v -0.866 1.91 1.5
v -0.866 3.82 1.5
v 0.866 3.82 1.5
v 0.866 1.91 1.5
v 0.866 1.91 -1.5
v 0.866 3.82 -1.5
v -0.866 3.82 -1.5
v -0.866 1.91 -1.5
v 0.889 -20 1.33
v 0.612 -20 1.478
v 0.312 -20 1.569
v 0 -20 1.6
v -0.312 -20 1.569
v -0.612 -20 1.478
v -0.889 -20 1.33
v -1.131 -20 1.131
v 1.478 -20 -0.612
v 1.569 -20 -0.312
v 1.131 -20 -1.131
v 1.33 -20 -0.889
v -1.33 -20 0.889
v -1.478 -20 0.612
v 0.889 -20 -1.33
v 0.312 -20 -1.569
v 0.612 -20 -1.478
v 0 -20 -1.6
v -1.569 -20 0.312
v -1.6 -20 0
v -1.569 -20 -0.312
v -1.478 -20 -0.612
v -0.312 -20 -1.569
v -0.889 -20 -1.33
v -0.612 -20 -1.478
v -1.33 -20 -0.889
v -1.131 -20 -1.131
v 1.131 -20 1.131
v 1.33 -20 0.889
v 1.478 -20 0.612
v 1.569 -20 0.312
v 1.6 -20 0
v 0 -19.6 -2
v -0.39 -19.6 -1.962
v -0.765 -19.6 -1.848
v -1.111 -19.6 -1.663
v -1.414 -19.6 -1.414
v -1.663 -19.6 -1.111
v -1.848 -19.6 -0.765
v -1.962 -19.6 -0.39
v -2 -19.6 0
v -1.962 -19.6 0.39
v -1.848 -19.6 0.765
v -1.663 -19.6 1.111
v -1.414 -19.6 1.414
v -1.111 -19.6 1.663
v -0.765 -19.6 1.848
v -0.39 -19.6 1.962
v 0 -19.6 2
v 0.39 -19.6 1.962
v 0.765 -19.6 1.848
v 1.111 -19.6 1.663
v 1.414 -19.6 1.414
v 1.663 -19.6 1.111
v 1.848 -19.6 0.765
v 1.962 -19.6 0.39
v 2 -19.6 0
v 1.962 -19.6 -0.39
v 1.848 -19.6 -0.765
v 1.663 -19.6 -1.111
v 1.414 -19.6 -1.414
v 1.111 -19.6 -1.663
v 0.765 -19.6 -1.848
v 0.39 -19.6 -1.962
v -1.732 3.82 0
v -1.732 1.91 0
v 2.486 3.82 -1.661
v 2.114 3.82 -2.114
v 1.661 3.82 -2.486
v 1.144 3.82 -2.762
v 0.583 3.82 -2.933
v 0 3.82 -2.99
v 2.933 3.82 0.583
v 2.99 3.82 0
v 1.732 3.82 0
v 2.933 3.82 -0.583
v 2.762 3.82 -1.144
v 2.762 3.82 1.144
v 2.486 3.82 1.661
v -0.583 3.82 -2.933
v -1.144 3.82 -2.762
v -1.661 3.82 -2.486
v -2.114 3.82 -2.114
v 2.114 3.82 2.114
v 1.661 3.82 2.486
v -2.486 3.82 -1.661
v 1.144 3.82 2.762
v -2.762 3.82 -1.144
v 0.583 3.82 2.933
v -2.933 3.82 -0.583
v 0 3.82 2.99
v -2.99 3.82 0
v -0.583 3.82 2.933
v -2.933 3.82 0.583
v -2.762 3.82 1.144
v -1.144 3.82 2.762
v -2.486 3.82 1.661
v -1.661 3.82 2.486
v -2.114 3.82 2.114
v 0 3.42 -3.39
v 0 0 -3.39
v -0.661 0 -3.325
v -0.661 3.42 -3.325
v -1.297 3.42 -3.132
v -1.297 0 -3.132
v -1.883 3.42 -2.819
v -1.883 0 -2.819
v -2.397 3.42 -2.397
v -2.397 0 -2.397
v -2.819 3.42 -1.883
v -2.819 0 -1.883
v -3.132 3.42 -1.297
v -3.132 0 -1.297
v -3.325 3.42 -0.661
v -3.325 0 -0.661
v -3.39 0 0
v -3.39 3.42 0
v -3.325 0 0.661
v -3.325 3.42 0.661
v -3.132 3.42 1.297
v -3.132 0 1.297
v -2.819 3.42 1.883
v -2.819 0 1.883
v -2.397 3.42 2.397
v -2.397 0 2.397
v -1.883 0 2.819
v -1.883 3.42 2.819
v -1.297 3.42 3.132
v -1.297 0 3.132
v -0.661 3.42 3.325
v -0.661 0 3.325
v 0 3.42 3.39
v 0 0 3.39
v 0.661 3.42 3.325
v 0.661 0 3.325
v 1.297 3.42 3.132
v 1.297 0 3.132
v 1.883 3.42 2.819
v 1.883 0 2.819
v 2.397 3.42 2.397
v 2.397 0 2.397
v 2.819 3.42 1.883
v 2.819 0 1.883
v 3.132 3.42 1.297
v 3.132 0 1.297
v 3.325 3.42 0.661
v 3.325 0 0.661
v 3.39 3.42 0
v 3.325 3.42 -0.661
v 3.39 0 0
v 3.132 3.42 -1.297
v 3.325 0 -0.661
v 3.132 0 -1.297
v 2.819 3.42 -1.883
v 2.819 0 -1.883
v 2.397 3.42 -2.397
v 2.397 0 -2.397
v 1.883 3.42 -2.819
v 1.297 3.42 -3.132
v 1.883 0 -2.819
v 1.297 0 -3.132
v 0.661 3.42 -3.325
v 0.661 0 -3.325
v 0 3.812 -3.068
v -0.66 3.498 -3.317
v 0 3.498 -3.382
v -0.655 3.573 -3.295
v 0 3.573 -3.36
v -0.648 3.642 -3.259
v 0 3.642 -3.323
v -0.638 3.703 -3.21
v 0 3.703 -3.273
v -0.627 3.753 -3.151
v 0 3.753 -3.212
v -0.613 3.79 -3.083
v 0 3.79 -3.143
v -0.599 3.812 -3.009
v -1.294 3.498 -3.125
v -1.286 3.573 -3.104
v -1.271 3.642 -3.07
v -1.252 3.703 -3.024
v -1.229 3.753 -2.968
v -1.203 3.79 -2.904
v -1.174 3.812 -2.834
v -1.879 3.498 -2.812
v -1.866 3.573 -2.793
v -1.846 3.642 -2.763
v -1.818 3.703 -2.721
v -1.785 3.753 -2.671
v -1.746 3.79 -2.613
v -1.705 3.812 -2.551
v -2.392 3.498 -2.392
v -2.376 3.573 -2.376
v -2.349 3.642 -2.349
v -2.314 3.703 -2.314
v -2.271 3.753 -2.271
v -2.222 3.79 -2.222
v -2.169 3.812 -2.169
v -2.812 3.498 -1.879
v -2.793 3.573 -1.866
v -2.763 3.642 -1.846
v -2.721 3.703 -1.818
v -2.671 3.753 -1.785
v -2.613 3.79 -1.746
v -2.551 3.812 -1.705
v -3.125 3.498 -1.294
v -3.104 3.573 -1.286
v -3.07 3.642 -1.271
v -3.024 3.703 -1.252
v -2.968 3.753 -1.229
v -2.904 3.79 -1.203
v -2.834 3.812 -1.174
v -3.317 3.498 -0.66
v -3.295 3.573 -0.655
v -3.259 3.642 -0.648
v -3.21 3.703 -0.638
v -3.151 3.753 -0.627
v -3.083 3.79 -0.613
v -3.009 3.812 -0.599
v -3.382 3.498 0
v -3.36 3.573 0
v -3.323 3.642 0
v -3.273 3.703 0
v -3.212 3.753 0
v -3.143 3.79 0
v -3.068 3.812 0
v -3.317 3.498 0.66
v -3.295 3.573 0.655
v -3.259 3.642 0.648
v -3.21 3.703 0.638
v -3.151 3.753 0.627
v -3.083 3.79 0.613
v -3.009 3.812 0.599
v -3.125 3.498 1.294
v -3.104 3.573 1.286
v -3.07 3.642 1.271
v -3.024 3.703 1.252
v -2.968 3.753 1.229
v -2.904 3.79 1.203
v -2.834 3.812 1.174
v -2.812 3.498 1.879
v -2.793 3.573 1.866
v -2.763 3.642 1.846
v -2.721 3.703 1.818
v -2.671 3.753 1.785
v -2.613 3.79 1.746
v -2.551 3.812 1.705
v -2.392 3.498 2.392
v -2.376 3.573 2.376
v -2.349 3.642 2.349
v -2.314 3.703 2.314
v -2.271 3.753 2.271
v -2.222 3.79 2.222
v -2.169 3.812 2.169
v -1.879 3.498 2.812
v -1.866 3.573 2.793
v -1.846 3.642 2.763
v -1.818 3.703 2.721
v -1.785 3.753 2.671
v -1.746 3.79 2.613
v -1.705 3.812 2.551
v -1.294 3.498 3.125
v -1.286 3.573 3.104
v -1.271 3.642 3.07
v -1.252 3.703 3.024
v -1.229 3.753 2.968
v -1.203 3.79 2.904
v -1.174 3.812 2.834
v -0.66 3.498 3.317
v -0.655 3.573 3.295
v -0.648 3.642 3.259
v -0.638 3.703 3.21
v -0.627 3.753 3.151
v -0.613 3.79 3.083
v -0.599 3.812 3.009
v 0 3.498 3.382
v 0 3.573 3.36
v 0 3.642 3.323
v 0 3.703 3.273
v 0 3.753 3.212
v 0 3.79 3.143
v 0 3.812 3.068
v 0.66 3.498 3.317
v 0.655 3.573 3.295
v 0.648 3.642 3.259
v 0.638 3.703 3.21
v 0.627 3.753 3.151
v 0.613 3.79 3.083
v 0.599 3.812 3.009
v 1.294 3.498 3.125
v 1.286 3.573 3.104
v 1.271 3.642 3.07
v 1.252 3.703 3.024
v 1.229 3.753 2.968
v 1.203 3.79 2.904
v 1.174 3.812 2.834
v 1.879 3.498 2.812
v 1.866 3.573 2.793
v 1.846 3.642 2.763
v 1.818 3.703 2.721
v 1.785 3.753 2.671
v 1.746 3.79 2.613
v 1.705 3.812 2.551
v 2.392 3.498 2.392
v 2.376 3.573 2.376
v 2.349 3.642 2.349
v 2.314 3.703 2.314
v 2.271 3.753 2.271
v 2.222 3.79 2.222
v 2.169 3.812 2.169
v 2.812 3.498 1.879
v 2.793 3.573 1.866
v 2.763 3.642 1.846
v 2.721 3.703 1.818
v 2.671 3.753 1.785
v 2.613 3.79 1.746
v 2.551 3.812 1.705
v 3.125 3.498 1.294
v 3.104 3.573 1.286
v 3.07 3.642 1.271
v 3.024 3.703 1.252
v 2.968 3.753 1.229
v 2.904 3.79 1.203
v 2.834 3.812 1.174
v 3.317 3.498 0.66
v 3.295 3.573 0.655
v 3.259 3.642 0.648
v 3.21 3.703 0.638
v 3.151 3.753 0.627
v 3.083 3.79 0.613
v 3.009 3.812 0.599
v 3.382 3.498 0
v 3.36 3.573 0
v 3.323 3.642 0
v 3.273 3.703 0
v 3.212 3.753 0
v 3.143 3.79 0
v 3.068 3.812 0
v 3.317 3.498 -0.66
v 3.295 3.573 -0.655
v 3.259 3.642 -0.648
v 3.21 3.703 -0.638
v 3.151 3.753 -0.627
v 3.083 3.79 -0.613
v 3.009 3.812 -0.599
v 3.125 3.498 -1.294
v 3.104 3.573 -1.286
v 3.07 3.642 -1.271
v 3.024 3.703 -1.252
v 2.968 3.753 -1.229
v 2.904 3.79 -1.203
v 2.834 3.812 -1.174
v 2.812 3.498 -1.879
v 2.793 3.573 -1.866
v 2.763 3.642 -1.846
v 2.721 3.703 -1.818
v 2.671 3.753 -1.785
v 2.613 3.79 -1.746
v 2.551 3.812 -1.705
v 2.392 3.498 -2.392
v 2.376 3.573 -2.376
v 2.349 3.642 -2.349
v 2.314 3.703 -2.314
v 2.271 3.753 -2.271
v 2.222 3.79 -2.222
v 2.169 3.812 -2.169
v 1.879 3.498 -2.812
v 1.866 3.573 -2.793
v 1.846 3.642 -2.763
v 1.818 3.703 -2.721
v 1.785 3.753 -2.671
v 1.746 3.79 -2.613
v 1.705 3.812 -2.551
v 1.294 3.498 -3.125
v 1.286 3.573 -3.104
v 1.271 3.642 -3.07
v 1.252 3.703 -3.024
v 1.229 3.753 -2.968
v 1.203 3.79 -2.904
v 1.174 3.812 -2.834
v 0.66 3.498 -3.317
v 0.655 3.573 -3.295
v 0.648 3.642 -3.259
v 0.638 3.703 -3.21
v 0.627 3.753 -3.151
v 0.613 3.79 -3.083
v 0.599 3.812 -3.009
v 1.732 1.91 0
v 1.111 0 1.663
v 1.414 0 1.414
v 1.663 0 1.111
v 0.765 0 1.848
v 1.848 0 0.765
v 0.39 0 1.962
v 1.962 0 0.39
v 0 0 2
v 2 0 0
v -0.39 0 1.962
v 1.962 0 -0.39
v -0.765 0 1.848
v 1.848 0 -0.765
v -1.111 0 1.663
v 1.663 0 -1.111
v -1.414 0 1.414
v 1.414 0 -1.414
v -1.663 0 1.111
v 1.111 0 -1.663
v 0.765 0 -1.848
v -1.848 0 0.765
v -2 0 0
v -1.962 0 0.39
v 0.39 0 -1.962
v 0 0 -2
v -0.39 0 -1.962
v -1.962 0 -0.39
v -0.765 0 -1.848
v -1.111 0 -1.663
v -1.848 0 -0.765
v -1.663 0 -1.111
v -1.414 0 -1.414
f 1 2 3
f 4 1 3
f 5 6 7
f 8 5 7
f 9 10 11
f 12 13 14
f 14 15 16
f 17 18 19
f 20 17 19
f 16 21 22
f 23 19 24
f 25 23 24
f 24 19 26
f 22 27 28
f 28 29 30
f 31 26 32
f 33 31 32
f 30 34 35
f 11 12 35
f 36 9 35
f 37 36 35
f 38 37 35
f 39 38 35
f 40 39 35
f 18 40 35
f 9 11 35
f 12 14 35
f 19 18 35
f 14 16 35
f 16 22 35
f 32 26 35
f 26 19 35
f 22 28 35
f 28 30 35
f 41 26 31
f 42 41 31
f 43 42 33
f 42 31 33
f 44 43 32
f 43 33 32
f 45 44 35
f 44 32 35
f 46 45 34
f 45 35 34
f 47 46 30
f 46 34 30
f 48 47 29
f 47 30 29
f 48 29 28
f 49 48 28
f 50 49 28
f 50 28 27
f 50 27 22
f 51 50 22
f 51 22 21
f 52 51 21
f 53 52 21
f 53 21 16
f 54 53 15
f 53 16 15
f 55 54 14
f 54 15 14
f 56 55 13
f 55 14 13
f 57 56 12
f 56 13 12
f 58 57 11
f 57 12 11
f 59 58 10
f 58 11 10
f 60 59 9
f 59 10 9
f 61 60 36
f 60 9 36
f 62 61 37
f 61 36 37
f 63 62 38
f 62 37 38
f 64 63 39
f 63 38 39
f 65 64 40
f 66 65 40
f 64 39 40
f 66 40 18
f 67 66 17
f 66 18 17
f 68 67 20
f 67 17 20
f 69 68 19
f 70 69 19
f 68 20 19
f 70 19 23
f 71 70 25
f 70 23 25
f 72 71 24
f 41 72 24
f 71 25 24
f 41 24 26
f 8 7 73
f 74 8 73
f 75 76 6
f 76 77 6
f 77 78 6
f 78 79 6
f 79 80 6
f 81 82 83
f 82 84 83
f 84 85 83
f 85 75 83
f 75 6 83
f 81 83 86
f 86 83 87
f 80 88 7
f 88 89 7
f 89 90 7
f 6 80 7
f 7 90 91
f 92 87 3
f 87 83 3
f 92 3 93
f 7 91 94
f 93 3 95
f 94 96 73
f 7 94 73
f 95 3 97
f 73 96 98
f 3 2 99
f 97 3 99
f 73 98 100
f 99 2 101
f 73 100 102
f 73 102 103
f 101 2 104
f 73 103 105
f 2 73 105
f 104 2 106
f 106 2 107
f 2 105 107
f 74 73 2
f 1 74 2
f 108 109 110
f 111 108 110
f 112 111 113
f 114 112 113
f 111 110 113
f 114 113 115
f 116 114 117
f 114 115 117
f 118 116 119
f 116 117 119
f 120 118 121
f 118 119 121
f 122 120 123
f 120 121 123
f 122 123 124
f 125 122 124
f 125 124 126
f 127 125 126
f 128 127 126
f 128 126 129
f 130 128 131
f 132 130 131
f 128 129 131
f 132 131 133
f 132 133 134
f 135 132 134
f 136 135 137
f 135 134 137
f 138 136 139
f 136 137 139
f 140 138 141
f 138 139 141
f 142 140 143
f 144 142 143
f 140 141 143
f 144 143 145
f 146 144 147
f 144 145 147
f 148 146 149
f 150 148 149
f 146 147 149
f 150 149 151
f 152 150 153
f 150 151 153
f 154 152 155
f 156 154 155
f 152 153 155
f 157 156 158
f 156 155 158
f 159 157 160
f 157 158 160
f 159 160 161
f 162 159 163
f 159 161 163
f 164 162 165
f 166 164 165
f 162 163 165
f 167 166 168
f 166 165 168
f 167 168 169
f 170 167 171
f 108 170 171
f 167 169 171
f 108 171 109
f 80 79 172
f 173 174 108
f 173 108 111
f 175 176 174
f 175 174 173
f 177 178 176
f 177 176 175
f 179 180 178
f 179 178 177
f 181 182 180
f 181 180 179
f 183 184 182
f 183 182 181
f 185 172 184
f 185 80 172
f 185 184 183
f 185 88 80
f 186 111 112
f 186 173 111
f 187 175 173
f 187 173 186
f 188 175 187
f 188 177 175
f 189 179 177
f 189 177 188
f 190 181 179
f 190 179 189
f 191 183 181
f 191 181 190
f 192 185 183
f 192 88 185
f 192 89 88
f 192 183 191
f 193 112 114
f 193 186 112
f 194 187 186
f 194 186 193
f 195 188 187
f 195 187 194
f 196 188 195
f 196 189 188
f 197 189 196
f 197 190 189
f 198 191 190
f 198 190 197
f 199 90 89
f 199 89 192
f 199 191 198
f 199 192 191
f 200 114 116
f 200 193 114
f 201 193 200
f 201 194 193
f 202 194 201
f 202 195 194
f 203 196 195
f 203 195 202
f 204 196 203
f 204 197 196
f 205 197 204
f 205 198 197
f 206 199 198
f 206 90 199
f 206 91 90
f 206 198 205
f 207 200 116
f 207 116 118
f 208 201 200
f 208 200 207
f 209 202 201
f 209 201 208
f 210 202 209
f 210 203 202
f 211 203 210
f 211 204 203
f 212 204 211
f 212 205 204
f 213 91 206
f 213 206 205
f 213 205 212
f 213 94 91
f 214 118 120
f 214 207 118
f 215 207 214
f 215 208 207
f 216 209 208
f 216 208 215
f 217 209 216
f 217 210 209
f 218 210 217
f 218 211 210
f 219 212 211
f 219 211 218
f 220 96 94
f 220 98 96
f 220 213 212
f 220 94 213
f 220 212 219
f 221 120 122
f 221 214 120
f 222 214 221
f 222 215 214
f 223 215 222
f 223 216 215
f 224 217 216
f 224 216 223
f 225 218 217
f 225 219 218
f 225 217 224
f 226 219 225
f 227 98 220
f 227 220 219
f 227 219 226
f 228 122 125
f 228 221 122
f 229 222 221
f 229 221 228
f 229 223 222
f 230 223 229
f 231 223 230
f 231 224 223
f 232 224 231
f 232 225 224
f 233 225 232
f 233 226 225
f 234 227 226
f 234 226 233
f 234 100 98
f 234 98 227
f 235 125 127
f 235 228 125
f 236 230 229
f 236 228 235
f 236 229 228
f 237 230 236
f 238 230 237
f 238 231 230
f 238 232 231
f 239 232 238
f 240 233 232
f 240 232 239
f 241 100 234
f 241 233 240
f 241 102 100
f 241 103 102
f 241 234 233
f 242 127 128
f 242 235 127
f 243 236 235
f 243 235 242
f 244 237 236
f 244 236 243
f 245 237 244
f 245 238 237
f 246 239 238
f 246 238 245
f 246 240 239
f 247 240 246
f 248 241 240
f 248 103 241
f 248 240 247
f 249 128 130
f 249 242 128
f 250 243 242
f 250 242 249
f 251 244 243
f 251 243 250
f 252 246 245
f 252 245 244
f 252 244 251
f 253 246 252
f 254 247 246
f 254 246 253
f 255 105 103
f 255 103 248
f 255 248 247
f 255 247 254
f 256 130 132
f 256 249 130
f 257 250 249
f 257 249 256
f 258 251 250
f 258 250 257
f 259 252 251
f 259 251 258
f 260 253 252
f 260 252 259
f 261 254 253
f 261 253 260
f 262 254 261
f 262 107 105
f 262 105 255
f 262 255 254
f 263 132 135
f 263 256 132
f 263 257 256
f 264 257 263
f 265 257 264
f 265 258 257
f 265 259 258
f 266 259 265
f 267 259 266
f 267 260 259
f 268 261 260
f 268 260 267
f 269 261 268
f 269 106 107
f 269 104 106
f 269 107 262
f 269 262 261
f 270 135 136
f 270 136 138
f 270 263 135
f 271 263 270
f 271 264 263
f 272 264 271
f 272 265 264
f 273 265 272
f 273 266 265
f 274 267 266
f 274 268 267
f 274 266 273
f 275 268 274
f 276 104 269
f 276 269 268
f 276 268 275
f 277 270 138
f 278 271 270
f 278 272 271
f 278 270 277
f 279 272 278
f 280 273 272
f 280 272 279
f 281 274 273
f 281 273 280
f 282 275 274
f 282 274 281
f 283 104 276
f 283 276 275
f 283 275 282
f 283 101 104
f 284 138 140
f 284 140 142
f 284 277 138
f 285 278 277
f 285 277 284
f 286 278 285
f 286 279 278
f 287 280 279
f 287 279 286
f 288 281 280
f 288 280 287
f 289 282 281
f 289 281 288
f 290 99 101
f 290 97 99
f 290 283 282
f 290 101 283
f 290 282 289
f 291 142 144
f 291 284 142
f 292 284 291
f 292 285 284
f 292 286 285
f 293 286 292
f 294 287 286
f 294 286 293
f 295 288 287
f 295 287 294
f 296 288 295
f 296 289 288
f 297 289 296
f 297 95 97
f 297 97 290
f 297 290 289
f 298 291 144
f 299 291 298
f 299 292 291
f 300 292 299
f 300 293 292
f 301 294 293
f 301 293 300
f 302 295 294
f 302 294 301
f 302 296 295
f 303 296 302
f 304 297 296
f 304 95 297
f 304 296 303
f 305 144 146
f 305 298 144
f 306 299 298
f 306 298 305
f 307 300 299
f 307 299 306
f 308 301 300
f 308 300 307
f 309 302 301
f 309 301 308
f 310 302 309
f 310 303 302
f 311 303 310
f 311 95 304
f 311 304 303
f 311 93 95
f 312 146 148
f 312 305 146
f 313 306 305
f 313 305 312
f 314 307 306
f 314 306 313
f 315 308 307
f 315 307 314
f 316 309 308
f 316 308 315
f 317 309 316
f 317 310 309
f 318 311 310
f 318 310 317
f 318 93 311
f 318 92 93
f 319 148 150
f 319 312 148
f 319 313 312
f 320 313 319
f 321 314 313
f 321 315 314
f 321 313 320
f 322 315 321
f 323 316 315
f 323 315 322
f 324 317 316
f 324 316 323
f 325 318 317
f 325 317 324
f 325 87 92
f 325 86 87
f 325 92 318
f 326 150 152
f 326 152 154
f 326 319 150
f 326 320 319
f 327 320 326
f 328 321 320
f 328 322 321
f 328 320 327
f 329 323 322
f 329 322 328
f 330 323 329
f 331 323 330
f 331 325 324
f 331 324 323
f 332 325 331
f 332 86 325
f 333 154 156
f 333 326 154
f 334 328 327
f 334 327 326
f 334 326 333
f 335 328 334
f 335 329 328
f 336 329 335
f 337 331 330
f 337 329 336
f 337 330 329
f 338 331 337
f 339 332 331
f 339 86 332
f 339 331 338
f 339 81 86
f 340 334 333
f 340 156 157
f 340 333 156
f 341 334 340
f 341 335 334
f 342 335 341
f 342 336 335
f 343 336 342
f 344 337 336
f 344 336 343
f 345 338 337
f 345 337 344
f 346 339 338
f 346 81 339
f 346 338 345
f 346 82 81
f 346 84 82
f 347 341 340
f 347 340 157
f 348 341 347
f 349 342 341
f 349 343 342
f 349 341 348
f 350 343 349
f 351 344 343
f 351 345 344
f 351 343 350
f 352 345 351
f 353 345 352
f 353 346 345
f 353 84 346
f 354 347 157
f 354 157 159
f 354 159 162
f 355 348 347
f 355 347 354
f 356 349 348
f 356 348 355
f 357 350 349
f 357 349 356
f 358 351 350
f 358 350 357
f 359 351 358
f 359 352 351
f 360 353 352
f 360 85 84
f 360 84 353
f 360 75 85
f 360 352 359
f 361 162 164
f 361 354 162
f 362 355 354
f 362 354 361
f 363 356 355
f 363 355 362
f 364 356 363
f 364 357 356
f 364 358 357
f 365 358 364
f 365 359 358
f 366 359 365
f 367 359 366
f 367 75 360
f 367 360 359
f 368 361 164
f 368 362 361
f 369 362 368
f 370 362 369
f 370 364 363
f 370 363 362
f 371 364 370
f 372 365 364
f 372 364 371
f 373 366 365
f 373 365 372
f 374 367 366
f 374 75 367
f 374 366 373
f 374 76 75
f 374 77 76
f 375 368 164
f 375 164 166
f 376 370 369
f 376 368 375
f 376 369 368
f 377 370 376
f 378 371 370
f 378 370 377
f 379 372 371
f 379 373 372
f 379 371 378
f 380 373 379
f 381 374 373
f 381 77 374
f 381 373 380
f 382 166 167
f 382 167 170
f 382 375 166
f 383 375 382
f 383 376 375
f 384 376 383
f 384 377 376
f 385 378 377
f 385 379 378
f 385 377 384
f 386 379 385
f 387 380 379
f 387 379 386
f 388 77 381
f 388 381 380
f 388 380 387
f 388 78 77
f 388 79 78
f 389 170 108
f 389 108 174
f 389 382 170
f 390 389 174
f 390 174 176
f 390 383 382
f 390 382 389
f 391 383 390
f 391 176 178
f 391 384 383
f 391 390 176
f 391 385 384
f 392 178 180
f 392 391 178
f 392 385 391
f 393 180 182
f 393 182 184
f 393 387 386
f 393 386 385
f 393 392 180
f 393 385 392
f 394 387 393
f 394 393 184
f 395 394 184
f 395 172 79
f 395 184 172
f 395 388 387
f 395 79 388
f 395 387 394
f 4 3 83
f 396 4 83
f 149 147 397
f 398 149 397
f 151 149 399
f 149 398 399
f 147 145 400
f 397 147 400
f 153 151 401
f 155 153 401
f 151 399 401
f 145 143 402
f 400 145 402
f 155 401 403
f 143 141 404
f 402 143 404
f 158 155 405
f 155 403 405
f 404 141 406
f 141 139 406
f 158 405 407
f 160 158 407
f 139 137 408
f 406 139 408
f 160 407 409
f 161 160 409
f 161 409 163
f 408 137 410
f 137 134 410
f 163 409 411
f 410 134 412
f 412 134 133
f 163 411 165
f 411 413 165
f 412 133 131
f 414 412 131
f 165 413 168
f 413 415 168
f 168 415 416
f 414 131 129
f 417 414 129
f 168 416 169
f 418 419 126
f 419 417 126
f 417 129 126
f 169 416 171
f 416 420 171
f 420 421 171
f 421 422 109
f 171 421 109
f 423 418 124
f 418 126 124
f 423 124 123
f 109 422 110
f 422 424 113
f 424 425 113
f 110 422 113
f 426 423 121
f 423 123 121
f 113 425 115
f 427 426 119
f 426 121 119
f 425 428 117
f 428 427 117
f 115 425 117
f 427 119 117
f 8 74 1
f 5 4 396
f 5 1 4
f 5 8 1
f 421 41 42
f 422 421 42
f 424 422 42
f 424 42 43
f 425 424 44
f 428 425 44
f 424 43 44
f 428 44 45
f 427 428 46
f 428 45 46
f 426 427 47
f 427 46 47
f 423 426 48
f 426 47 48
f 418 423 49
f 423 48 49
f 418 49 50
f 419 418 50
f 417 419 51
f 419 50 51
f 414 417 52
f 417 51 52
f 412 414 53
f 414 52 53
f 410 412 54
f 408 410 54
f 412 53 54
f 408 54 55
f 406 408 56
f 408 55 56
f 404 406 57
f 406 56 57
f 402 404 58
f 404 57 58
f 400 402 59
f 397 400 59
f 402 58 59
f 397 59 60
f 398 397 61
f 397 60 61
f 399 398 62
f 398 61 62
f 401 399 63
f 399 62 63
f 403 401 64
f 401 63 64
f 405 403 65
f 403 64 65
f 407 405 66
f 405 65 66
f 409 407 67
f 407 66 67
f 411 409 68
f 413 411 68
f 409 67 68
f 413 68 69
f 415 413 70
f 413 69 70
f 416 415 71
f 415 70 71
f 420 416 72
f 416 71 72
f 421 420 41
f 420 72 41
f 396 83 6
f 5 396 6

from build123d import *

# Parameters (mm, degrees)
CHAMFER1_SIZE      = 0.4
FILLET1_R          = 0.4
CUT_EXTRUDE1_DEPTH = 1.91


with BuildPart() as part:
    # Sketch1 → Revolve1 (revolve)
    with BuildSketch(Plane.XY, mode=Mode.PRIVATE) as revolve1_sk:
        Polygon((0, 0), (0, 3.82), (3.39, 3.82), (3.39, 0), (2, 0), (2, -20), (0, -20), align=None)
    revolve(revolve1_sk.sketch.rotate(Axis((0, 3.82, 0), (0, 1, 0)), 90), axis=Axis((0, 3.82, 0), (0, 1, 0)))

    # Chamfer1
    chamfer1_edges = [part.edges().sort_by_distance(p)[0] for p in [
        (0, -20, 2),
    ]]
    chamfer(chamfer1_edges, length=CHAMFER1_SIZE)

    # Fillet1
    fillet1_edges = [part.edges().sort_by_distance(p)[0] for p in [
        (0, 3.82, 3.39),
    ]]
    fillet(fillet1_edges, radius=FILLET1_R)

    # Sketch2 → Cut-Extrude1 (cut)
    with BuildSketch(Plane(origin=(0, 3.82, 0), x_dir=(1, 0, 0), z_dir=(0, 1, 0))):
        Polygon((0.866025404, -1.5), (1.732050808, 0), (0.866025404, 1.5), (-0.866025404, 1.5), (-1.732050808, 0), (-0.866025404, -1.5), align=None)
    extrude(amount=-CUT_EXTRUDE1_DEPTH, mode=Mode.SUBTRACT)


solid = part.part
